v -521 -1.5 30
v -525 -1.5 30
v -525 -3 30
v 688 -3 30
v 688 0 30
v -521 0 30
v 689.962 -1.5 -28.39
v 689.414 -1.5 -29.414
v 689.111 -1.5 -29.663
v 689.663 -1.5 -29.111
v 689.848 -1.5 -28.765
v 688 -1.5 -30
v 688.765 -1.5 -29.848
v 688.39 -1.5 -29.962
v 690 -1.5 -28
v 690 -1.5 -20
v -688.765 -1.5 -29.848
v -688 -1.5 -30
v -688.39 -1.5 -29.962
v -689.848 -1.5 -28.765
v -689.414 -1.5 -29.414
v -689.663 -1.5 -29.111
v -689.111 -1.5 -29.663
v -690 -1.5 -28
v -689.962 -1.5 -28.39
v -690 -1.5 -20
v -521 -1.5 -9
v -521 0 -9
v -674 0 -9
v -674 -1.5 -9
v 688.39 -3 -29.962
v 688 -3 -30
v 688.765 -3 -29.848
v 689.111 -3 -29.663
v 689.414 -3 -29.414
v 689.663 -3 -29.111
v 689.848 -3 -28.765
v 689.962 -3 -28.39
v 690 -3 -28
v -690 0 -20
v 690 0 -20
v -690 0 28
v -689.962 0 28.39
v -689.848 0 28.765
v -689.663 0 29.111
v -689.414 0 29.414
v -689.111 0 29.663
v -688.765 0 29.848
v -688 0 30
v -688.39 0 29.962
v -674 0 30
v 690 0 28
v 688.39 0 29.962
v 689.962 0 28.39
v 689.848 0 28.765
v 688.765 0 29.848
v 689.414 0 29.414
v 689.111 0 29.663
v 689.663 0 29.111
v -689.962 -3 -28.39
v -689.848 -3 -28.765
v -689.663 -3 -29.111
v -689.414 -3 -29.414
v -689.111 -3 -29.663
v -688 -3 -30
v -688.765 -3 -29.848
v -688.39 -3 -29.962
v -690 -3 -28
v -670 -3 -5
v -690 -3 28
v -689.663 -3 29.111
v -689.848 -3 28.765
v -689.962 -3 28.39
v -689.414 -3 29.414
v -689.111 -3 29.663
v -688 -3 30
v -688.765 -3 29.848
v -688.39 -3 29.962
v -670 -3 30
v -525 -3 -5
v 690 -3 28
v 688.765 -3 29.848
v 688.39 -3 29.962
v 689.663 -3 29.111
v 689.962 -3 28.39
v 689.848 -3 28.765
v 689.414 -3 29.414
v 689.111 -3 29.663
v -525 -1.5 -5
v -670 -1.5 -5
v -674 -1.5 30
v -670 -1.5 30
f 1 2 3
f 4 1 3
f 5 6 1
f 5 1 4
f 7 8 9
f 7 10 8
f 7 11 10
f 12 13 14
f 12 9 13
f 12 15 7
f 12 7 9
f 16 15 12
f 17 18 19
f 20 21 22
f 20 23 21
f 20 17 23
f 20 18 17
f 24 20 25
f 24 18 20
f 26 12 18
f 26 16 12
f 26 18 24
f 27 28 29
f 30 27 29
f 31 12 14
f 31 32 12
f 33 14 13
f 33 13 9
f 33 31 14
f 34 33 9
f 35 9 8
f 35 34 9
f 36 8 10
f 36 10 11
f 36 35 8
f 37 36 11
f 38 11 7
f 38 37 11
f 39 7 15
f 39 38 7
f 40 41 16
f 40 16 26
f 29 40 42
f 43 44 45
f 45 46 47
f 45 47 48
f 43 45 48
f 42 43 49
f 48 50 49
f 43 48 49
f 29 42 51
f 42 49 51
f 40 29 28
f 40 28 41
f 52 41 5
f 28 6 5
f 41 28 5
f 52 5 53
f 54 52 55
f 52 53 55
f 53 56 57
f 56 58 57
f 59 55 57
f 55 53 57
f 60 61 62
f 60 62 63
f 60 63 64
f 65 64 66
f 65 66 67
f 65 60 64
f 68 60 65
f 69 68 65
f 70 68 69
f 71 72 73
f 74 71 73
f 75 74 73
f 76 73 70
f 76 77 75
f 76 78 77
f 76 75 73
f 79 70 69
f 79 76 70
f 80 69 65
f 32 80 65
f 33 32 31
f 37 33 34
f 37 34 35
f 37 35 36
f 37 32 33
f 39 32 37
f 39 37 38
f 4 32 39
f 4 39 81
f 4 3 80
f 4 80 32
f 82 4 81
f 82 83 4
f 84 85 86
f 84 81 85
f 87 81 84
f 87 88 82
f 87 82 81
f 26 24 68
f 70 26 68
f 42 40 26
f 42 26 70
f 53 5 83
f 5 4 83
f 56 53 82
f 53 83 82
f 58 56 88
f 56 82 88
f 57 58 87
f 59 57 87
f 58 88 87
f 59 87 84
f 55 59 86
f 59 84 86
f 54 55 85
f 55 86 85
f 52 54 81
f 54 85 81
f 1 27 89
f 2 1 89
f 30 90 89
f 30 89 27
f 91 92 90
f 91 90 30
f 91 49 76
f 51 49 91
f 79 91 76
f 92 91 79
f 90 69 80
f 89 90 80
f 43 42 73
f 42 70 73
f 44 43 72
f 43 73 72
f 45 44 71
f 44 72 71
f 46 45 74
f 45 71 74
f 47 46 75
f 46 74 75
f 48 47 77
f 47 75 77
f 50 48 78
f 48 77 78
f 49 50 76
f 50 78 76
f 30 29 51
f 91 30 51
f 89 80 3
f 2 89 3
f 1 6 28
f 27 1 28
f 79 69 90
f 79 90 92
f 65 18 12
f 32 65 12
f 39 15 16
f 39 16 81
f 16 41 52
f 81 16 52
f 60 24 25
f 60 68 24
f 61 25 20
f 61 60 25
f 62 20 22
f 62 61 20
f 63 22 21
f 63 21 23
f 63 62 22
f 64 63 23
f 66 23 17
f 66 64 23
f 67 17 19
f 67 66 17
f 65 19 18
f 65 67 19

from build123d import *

# Parameters (mm, degrees)
F0_W     = 1380
F0_H     = 60
F1_DEPTH = 3
F2_W     = 1380
F2_H     = 10
F3_DEPTH = 1.5
F4_R     = 2
F5_W     = 145
F5_H     = 35
F6_DEPTH = 3
F8_DEPTH = 1.5


with BuildPart() as f1:
    # F0 (on Front) → F1 (new body)
    with BuildSketch(Plane.XZ):
        Rectangle(F0_W, F0_H)
    extrude(amount=F1_DEPTH)

    # F2 (on face) → F3 (cut)
    with BuildSketch(Plane(origin=(0, 0, 0), x_dir=(-1, 0, 0), z_dir=(0, 1, 0))):
        with Locations((0, -25)):
            Rectangle(F2_W, F2_H)
    extrude(amount=-F3_DEPTH, mode=Mode.SUBTRACT)

    # F4
    f4_edges = [f1.edges().sort_by_distance(p)[0] for p in [
        (690, -2.25, -30),
        (690, -1.5, 30),
        (-690, -1.5, 30),
        (-690, -2.25, -30),
    ]]
    fillet(f4_edges, radius=F4_R)

    # F5 (on face) → F6 (cut)
    with BuildSketch(Plane.XZ.offset(3)):
        with Locations((-597.5, 12.5)):
            Rectangle(F5_W, F5_H)
    extrude(amount=-F6_DEPTH, mode=Mode.SUBTRACT)

    # F7 (on face) → F8 (cut)
    with BuildSketch(Plane(origin=(0, 0, 0), x_dir=(-1, 0, 0), z_dir=(0, 1, 0))):
        Polygon((525, -5), (525, 30), (521, 30), (521, -9), (674, -9), (674, 30), (670, 30), (670, -5), align=None)
    extrude(amount=-F8_DEPTH, mode=Mode.SUBTRACT)


solid = f1.part
